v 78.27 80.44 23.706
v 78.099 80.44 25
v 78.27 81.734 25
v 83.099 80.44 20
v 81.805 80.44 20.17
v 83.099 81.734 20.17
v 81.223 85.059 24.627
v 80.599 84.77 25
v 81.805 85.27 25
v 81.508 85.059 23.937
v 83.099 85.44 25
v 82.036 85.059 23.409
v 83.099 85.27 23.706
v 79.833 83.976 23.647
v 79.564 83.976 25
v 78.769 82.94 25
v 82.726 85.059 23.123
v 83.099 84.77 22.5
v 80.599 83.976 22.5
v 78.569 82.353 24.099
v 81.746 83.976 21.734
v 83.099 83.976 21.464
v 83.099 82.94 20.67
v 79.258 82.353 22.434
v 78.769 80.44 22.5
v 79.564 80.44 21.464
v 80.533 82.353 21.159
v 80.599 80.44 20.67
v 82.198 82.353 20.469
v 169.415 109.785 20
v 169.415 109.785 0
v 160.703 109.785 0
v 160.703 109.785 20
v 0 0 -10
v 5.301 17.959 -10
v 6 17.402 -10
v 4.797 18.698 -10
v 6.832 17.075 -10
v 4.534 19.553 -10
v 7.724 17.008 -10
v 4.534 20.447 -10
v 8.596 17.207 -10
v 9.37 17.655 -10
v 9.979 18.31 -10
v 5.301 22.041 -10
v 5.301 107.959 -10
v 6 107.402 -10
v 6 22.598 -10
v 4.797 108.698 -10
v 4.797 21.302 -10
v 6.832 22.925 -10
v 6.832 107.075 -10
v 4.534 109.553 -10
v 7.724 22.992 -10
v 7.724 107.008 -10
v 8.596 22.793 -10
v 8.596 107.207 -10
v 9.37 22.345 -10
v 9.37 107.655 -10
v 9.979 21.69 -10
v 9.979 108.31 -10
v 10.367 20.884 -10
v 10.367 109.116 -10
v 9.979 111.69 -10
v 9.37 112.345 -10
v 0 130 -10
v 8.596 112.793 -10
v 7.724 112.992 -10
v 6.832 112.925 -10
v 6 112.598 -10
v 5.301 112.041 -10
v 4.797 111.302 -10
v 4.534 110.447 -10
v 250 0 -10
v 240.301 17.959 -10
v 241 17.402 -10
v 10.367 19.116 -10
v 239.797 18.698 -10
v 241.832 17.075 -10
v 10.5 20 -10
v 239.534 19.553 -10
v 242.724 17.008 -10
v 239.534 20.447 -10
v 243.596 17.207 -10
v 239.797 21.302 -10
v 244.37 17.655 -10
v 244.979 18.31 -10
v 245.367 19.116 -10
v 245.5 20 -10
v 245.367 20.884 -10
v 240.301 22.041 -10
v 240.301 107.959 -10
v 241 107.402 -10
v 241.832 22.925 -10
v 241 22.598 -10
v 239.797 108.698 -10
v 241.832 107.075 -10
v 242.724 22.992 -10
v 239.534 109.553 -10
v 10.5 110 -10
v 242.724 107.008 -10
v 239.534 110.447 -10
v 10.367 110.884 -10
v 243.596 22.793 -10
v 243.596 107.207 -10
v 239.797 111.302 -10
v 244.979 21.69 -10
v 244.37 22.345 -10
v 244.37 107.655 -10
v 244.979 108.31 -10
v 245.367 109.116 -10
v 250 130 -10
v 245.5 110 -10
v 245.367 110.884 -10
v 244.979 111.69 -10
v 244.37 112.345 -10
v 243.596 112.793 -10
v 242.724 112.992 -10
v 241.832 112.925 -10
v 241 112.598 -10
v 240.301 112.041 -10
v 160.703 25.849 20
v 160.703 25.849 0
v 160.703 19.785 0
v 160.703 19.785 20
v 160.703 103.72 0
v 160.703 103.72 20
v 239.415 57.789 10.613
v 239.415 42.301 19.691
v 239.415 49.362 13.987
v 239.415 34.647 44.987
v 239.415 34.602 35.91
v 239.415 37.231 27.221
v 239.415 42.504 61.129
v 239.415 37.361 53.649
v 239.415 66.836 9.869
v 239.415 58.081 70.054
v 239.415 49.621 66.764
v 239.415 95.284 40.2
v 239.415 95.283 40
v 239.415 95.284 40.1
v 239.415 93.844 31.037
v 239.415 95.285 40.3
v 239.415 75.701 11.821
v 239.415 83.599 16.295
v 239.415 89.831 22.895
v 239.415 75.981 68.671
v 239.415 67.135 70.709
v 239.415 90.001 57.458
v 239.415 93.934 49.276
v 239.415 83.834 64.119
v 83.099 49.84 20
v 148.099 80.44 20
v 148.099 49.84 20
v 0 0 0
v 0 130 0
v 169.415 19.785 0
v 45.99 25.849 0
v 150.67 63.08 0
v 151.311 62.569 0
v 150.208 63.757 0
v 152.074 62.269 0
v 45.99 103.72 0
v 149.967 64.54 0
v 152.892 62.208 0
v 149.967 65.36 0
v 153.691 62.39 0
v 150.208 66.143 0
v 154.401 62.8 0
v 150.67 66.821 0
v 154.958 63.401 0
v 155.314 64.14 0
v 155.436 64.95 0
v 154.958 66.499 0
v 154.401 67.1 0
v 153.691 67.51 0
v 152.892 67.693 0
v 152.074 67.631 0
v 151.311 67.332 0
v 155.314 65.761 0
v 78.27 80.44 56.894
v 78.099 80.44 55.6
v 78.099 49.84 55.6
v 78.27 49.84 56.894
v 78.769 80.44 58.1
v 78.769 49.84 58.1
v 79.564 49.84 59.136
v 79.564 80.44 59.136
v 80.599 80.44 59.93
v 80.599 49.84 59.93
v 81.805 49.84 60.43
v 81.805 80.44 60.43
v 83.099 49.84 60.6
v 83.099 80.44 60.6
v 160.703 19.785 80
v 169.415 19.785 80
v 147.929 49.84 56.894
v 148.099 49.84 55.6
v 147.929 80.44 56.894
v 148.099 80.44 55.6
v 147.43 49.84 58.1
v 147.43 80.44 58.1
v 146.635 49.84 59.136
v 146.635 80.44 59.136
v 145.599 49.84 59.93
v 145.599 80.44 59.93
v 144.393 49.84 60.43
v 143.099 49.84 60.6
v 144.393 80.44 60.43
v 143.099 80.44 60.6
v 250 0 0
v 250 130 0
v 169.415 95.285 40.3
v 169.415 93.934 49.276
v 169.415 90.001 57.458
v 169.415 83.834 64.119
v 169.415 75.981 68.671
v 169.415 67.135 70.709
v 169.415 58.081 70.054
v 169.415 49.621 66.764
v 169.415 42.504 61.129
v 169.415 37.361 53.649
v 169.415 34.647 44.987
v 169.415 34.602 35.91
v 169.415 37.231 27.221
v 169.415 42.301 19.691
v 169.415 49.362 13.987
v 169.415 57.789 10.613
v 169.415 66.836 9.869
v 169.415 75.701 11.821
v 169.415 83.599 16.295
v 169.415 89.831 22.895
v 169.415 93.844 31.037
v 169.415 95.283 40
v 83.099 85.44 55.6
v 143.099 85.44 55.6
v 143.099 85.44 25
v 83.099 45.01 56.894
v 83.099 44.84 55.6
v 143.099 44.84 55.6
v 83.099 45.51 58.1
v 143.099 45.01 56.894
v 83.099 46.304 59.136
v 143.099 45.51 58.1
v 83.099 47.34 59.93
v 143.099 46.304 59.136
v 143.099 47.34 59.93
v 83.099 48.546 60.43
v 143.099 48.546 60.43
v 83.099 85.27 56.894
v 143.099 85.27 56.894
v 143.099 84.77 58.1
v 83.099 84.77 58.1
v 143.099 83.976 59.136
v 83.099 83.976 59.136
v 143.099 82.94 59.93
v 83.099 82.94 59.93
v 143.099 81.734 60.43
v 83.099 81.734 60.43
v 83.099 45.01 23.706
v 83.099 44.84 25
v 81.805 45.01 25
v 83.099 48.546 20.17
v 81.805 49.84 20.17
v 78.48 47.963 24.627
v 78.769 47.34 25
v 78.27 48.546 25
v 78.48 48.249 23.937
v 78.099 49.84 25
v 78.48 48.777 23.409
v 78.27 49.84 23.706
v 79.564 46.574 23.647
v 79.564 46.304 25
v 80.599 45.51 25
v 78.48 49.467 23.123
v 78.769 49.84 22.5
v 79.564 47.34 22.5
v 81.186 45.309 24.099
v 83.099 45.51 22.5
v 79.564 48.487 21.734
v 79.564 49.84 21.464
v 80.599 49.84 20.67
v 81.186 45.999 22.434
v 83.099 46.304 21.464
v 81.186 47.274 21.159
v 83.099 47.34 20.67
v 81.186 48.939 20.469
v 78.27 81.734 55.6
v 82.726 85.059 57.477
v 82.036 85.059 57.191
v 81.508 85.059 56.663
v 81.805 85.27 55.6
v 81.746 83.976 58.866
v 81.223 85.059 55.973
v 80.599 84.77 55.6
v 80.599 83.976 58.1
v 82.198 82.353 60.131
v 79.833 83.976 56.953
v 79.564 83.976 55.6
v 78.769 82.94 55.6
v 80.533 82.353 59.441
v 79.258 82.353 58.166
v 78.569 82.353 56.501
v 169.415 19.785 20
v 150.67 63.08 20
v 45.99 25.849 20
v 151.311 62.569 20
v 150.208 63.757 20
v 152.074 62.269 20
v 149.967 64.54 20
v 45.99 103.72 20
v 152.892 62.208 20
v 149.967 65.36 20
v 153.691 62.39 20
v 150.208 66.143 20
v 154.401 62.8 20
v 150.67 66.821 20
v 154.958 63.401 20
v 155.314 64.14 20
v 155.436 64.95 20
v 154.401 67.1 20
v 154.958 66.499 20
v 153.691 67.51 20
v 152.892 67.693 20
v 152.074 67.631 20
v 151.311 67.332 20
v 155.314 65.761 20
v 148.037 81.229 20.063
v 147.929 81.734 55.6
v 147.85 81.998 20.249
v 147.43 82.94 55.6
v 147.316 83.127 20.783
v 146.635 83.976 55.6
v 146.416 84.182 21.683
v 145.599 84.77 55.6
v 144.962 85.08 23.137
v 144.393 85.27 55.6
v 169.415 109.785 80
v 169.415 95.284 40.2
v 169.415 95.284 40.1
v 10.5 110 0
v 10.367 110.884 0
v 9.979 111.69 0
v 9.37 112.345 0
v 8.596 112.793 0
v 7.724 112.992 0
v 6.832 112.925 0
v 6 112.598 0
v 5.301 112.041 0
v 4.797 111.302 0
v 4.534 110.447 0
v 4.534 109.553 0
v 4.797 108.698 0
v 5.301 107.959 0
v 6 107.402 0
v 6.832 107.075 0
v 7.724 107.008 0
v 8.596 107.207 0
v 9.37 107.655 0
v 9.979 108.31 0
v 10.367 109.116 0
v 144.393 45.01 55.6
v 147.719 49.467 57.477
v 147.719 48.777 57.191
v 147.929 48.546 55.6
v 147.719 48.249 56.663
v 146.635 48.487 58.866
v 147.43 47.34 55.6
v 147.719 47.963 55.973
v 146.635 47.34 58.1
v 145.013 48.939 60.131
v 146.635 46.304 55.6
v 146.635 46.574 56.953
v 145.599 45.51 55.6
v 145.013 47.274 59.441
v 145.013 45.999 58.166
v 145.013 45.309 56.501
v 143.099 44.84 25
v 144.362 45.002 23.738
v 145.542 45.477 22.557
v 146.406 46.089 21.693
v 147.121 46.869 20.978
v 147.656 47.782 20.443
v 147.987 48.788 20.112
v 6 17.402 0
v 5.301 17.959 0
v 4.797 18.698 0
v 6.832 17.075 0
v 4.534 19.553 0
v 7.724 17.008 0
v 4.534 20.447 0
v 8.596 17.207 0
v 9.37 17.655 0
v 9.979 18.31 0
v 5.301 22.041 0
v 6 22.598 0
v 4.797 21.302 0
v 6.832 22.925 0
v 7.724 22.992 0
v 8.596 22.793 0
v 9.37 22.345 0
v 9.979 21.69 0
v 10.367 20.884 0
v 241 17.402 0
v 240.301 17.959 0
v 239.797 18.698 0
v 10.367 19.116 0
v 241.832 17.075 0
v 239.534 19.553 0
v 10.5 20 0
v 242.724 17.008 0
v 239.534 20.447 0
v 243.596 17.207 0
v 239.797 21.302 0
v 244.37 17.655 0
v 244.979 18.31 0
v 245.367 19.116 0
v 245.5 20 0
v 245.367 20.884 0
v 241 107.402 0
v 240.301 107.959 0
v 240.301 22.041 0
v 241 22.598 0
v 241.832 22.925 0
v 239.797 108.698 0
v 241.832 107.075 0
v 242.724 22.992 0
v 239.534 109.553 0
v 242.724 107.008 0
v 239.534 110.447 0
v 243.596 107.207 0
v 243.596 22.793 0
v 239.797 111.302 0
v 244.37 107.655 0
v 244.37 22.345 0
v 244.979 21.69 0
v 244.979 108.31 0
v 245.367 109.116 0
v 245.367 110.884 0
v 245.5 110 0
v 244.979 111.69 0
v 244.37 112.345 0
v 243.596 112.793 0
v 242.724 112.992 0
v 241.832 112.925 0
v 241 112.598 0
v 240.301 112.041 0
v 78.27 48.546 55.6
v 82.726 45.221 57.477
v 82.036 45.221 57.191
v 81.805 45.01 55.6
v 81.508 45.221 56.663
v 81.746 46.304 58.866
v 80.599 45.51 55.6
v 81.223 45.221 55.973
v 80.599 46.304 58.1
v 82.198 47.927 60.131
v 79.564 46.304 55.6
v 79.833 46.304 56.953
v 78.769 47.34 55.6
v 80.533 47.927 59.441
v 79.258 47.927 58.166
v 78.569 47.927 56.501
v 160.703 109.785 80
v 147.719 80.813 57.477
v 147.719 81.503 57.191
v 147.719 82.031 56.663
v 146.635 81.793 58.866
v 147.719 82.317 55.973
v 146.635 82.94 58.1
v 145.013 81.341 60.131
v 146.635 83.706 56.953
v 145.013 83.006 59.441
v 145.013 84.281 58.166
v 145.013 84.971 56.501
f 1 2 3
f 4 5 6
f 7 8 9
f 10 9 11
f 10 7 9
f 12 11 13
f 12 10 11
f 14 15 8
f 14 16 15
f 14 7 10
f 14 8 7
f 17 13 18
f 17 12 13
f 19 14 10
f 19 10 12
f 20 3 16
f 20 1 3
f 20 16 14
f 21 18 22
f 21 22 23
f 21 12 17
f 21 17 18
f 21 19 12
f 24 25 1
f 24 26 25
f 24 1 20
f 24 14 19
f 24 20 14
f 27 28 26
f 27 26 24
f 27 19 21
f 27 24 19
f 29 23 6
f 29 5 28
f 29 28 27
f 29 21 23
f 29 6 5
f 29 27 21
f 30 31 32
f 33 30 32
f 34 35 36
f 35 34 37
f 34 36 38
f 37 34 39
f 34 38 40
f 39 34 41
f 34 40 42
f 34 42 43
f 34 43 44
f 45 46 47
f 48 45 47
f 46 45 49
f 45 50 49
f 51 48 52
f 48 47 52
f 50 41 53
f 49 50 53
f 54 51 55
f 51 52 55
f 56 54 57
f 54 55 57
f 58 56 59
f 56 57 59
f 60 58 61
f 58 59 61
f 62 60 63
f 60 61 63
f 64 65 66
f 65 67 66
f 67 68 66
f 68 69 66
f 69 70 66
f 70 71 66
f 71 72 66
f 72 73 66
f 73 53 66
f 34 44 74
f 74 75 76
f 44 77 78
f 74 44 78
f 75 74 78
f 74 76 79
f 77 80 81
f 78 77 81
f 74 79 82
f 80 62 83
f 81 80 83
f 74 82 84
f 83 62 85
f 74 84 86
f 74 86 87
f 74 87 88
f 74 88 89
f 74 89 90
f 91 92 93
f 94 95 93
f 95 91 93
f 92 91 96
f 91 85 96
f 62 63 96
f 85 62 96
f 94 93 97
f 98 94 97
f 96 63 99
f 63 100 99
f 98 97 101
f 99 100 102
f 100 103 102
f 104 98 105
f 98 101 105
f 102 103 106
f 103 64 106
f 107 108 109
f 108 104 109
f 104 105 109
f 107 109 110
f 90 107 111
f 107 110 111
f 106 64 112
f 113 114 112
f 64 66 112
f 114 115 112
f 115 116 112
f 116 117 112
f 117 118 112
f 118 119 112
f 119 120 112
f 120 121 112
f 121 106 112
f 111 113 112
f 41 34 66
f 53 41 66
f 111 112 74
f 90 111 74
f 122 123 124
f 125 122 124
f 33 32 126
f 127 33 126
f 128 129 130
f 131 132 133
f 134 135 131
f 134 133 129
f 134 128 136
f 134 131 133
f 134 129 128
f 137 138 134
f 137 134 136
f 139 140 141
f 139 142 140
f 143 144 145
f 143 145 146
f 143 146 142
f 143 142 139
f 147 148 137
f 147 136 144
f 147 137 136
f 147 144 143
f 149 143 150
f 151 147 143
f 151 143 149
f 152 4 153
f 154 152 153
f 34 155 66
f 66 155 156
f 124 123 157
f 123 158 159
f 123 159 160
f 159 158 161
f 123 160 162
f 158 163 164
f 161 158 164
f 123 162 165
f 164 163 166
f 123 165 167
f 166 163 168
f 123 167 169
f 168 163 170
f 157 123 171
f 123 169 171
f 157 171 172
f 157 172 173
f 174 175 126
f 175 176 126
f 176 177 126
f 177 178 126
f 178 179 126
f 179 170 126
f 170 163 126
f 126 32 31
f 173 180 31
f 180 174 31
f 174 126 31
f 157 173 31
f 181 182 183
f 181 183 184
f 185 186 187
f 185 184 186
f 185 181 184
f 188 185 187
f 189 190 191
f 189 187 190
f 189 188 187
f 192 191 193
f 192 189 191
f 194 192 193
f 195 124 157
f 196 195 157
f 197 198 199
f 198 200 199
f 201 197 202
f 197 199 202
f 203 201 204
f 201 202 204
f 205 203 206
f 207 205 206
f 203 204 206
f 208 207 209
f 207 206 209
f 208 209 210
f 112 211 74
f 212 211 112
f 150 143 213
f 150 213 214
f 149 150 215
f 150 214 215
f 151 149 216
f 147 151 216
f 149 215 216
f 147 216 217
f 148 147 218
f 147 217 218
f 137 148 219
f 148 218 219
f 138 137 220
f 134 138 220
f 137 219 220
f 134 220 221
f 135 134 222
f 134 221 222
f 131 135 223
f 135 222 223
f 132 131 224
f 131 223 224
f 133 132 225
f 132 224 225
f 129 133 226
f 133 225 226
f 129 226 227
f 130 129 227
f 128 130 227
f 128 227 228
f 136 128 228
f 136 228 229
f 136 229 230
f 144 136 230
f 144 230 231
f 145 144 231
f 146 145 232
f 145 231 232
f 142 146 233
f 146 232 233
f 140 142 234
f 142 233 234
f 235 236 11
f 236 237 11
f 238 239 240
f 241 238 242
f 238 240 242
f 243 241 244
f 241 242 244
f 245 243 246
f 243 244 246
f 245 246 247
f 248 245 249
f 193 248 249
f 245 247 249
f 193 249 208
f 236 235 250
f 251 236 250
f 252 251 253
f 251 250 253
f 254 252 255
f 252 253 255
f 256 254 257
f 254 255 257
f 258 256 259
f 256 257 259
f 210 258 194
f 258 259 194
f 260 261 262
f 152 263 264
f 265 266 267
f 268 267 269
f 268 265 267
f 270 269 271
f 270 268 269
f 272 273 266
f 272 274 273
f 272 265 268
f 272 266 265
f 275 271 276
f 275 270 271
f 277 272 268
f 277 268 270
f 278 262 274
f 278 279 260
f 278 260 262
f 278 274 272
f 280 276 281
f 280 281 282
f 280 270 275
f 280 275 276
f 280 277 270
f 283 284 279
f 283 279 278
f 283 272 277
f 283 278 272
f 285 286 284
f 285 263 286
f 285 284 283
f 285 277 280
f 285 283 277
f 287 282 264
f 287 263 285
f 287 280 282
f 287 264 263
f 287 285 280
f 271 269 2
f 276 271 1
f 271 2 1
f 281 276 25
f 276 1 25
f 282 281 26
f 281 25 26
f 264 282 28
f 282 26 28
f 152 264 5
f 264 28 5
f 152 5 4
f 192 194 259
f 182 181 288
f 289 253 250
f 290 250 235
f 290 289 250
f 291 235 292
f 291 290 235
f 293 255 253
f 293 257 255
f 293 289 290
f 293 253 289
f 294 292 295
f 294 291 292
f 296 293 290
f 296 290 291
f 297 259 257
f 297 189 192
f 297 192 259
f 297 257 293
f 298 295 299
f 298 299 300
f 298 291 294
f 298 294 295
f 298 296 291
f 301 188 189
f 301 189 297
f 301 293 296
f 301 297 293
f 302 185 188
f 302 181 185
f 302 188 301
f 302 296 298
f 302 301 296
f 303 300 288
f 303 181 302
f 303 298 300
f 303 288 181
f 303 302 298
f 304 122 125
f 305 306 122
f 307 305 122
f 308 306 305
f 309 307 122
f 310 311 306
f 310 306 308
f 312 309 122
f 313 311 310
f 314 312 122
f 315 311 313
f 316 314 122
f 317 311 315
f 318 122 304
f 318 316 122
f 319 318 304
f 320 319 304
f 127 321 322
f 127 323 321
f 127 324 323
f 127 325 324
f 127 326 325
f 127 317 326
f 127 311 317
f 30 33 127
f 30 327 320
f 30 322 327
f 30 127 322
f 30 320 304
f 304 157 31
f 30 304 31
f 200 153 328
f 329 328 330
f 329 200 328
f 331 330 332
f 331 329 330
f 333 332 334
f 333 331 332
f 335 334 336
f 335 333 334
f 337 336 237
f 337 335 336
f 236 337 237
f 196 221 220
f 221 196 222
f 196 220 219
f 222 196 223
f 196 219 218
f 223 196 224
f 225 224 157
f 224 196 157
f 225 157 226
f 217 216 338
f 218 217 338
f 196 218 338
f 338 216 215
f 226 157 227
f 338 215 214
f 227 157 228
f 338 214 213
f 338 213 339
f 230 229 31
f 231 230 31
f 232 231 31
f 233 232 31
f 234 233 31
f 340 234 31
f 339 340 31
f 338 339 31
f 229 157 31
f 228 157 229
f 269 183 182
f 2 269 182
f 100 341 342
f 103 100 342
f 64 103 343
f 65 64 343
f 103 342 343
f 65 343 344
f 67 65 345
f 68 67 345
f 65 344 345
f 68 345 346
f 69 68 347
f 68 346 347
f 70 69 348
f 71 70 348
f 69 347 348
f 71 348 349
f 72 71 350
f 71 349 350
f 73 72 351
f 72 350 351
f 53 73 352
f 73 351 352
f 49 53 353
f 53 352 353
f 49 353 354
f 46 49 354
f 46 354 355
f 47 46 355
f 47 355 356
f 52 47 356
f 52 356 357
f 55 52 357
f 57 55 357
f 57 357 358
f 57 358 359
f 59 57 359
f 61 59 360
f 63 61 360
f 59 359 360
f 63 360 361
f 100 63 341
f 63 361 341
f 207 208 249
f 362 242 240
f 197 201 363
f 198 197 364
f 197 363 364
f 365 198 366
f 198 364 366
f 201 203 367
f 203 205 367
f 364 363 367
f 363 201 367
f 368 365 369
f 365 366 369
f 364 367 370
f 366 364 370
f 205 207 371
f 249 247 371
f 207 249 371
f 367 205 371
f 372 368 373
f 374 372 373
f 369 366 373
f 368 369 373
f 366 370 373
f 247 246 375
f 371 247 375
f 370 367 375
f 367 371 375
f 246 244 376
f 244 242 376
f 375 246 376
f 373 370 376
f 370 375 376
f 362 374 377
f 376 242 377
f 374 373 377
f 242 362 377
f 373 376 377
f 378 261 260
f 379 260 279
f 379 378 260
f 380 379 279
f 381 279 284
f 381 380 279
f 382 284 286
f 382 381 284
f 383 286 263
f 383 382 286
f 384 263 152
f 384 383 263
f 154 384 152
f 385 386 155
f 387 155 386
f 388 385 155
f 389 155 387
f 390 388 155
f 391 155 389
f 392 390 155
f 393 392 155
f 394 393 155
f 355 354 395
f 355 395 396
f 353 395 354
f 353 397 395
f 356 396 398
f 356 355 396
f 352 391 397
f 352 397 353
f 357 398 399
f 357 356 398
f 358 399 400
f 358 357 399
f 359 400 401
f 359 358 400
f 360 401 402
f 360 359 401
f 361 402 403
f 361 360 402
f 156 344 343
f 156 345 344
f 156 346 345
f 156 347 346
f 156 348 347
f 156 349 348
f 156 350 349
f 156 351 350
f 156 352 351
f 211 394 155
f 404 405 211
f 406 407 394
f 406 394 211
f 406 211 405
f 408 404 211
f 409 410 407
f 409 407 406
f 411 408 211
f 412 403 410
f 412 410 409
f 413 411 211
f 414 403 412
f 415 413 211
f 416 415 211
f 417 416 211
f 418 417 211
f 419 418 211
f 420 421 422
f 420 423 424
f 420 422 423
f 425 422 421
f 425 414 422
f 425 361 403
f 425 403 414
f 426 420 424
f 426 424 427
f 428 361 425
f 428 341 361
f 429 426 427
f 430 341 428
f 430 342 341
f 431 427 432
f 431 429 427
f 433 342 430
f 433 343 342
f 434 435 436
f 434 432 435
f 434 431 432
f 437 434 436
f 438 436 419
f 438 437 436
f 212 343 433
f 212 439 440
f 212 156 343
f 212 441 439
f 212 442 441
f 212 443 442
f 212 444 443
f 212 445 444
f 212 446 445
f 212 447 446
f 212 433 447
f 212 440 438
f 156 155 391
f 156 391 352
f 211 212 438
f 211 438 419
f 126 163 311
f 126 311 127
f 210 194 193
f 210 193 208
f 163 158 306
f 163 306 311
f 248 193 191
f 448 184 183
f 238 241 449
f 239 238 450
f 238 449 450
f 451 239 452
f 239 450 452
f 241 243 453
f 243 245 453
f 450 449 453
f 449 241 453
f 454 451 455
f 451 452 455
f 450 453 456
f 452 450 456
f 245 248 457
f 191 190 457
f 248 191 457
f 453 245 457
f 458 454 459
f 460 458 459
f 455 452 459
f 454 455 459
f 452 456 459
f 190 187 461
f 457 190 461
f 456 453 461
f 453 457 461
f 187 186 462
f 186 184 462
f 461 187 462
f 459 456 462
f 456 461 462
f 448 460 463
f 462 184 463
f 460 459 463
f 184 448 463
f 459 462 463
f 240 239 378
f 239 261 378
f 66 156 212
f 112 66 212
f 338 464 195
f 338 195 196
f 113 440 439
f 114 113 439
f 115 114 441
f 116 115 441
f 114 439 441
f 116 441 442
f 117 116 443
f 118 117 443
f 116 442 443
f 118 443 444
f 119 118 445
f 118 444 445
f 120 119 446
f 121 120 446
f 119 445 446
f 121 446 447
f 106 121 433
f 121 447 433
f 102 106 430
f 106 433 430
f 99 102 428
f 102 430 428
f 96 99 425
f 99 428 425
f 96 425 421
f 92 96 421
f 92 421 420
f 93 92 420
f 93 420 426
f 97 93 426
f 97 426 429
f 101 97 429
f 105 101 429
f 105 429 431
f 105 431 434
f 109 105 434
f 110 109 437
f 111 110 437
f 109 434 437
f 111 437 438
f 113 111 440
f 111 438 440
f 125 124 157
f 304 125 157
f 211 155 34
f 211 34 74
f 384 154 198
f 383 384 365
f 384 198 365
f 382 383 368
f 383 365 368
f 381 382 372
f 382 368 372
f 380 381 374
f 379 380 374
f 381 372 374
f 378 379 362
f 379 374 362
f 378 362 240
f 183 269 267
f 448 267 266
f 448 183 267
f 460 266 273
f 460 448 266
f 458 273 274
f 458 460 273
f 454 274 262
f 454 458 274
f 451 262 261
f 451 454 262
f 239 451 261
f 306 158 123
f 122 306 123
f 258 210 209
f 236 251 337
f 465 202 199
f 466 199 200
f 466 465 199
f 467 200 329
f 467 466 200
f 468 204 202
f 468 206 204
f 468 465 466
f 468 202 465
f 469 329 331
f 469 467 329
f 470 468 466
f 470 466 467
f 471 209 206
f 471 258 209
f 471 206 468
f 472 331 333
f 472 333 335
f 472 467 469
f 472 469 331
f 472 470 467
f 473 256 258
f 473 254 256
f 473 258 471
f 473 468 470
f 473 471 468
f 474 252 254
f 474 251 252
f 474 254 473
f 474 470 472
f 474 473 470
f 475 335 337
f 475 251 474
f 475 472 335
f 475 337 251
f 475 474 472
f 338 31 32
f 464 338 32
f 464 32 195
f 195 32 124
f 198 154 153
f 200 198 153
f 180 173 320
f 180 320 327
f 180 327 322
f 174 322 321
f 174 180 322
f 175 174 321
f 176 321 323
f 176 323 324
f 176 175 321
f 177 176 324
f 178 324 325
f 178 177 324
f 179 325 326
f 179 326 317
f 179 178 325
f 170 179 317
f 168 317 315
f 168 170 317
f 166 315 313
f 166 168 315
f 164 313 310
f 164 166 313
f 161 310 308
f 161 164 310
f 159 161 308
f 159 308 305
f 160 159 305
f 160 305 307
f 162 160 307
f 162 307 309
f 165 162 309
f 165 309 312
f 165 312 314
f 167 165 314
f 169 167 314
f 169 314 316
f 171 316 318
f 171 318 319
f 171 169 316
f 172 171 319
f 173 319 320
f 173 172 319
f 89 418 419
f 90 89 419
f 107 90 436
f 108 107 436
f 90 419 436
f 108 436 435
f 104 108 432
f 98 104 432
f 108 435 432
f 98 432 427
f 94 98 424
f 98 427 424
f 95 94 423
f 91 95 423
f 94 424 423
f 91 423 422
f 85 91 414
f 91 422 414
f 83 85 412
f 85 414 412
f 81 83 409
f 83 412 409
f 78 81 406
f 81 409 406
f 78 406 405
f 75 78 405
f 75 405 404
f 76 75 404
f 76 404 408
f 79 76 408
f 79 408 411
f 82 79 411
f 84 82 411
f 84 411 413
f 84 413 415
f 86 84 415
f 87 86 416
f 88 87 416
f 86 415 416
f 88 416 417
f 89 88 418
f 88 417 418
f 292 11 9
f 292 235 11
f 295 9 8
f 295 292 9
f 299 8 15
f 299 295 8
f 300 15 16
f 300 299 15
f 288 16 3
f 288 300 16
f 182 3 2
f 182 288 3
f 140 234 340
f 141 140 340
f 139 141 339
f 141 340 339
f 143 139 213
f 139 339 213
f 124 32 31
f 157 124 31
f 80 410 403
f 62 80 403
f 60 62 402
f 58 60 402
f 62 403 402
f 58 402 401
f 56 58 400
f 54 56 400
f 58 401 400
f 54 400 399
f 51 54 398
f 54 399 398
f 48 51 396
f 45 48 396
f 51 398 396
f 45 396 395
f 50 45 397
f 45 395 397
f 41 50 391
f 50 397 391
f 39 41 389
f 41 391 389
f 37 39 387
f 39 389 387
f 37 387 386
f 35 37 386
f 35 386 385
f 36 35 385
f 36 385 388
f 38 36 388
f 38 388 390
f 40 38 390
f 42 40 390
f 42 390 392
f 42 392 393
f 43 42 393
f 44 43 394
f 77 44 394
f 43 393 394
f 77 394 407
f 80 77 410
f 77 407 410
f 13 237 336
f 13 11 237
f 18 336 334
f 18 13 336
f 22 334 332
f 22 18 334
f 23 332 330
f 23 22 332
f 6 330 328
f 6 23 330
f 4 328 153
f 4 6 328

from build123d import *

# Parameters (mm, degrees)
F0_W     = 250
F0_H     = 130
F0_R     = 3
F1_DEPTH = 10
F2_W     = 114.71279338
F2_H     = 77.8716804087
F2_R     = 2.75
F3_DEPTH = 20
F4_DEPTH = 80
F6_W     = 0.0666481256
F6_H     = 40.6
F6_W_2   = 69.9333518744
F7_DEPTH = 40.6
F8_R     = 5
F9_DEPTH = 70


with BuildPart() as f1:
    # F0 (on Top) → F1 (new body)
    with BuildSketch(Plane.XY):
        with Locations((125, 65)):
            Rectangle(F0_W, F0_H)
        with Locations((7.5, 20)):
            Circle(F0_R, mode=Mode.SUBTRACT)
        with Locations((242.5, 20)):
            Circle(F0_R, mode=Mode.SUBTRACT)
        with Locations((7.5, 110)):
            Circle(F0_R, mode=Mode.SUBTRACT)
        with Locations((242.5, 110)):
            Circle(F0_R, mode=Mode.SUBTRACT)
    extrude(amount=-F1_DEPTH)


with BuildPart() as f3:
    # F2 (on Top) → F3 (new body)
    with BuildSketch(Plane.XY):
        with Locations((103.3462490886, 64.7845622897)):
            Rectangle(F2_W, F2_H)
        with Locations((152.6860141896, 64.9501949326)):
            Circle(F2_R, mode=Mode.SUBTRACT)
        Polygon((160.7026457787, 109.7845622897), (160.7026457787, 103.7204024941), (160.7026457787, 25.8487220854), (160.7026457787, 19.7845622897), (169.4147884846, 19.7845622897), (169.4147884846, 109.7845622897), align=None)
    extrude(amount=F3_DEPTH)


with BuildPart() as f4:
    # F2 (on Top) → F4 (new body)
    with BuildSketch(Plane.XY):
        Polygon((160.7026457787, 109.7845622897), (160.7026457787, 103.7204024941), (160.7026457787, 25.8487220854), (160.7026457787, 19.7845622897), (169.4147884846, 19.7845622897), (169.4147884846, 109.7845622897), align=None)
    extrude(amount=F4_DEPTH)

    # F5 (on face) → F9 (join)
    with BuildSketch(Plane.YZ.offset(169.4147884846)):
        with BuildLine():
            ThreePointArc((95.2830868442, 40), (95.2841934261, 40.1499981859), (95.2845622897, 40.3))
            ThreePointArc((95.2845622897, 40.3), (64.6345604756, 70.7996311364), (34.2860377352, 40))
            ThreePointArc((34.2860377352, 40), (64.7845622897, 9.8), (95.2830868442, 40))
        make_face()
    extrude(amount=F9_DEPTH)


with BuildPart() as f7:
    # F6 (on face) → F7 (new body)
    with BuildSketch(Plane.XY.offset(20)):
        with Locations((148.0660647154, 65.1399716735)):
            Rectangle(F6_W, F6_H)
        with Locations((113.0660647154, 65.1399716735)):
            Rectangle(F6_W_2, F6_H)
    extrude(amount=F7_DEPTH)

    # F8
    f8_edges = [f7.edges().sort_by_distance(p)[0] for p in [
        (78.099389, 65.139972, 60.6),
        (113.099389, 85.439972, 60.6),
        (113.099389, 44.839972, 60.6),
        (148.099389, 65.139972, 60.6),
        (148.099389, 44.839972, 40.3),
        (113.099389, 44.839972, 20),
        (78.099389, 44.839972, 40.3),
        (78.099389, 65.139972, 20),
        (78.099389, 85.439972, 40.3),
        (113.099389, 85.439972, 20),
        (148.099389, 85.439972, 40.3),
    ]]
    fillet(f8_edges, radius=F8_R)


solid = Compound([f1.part, f3.part, f4.part, f7.part])
